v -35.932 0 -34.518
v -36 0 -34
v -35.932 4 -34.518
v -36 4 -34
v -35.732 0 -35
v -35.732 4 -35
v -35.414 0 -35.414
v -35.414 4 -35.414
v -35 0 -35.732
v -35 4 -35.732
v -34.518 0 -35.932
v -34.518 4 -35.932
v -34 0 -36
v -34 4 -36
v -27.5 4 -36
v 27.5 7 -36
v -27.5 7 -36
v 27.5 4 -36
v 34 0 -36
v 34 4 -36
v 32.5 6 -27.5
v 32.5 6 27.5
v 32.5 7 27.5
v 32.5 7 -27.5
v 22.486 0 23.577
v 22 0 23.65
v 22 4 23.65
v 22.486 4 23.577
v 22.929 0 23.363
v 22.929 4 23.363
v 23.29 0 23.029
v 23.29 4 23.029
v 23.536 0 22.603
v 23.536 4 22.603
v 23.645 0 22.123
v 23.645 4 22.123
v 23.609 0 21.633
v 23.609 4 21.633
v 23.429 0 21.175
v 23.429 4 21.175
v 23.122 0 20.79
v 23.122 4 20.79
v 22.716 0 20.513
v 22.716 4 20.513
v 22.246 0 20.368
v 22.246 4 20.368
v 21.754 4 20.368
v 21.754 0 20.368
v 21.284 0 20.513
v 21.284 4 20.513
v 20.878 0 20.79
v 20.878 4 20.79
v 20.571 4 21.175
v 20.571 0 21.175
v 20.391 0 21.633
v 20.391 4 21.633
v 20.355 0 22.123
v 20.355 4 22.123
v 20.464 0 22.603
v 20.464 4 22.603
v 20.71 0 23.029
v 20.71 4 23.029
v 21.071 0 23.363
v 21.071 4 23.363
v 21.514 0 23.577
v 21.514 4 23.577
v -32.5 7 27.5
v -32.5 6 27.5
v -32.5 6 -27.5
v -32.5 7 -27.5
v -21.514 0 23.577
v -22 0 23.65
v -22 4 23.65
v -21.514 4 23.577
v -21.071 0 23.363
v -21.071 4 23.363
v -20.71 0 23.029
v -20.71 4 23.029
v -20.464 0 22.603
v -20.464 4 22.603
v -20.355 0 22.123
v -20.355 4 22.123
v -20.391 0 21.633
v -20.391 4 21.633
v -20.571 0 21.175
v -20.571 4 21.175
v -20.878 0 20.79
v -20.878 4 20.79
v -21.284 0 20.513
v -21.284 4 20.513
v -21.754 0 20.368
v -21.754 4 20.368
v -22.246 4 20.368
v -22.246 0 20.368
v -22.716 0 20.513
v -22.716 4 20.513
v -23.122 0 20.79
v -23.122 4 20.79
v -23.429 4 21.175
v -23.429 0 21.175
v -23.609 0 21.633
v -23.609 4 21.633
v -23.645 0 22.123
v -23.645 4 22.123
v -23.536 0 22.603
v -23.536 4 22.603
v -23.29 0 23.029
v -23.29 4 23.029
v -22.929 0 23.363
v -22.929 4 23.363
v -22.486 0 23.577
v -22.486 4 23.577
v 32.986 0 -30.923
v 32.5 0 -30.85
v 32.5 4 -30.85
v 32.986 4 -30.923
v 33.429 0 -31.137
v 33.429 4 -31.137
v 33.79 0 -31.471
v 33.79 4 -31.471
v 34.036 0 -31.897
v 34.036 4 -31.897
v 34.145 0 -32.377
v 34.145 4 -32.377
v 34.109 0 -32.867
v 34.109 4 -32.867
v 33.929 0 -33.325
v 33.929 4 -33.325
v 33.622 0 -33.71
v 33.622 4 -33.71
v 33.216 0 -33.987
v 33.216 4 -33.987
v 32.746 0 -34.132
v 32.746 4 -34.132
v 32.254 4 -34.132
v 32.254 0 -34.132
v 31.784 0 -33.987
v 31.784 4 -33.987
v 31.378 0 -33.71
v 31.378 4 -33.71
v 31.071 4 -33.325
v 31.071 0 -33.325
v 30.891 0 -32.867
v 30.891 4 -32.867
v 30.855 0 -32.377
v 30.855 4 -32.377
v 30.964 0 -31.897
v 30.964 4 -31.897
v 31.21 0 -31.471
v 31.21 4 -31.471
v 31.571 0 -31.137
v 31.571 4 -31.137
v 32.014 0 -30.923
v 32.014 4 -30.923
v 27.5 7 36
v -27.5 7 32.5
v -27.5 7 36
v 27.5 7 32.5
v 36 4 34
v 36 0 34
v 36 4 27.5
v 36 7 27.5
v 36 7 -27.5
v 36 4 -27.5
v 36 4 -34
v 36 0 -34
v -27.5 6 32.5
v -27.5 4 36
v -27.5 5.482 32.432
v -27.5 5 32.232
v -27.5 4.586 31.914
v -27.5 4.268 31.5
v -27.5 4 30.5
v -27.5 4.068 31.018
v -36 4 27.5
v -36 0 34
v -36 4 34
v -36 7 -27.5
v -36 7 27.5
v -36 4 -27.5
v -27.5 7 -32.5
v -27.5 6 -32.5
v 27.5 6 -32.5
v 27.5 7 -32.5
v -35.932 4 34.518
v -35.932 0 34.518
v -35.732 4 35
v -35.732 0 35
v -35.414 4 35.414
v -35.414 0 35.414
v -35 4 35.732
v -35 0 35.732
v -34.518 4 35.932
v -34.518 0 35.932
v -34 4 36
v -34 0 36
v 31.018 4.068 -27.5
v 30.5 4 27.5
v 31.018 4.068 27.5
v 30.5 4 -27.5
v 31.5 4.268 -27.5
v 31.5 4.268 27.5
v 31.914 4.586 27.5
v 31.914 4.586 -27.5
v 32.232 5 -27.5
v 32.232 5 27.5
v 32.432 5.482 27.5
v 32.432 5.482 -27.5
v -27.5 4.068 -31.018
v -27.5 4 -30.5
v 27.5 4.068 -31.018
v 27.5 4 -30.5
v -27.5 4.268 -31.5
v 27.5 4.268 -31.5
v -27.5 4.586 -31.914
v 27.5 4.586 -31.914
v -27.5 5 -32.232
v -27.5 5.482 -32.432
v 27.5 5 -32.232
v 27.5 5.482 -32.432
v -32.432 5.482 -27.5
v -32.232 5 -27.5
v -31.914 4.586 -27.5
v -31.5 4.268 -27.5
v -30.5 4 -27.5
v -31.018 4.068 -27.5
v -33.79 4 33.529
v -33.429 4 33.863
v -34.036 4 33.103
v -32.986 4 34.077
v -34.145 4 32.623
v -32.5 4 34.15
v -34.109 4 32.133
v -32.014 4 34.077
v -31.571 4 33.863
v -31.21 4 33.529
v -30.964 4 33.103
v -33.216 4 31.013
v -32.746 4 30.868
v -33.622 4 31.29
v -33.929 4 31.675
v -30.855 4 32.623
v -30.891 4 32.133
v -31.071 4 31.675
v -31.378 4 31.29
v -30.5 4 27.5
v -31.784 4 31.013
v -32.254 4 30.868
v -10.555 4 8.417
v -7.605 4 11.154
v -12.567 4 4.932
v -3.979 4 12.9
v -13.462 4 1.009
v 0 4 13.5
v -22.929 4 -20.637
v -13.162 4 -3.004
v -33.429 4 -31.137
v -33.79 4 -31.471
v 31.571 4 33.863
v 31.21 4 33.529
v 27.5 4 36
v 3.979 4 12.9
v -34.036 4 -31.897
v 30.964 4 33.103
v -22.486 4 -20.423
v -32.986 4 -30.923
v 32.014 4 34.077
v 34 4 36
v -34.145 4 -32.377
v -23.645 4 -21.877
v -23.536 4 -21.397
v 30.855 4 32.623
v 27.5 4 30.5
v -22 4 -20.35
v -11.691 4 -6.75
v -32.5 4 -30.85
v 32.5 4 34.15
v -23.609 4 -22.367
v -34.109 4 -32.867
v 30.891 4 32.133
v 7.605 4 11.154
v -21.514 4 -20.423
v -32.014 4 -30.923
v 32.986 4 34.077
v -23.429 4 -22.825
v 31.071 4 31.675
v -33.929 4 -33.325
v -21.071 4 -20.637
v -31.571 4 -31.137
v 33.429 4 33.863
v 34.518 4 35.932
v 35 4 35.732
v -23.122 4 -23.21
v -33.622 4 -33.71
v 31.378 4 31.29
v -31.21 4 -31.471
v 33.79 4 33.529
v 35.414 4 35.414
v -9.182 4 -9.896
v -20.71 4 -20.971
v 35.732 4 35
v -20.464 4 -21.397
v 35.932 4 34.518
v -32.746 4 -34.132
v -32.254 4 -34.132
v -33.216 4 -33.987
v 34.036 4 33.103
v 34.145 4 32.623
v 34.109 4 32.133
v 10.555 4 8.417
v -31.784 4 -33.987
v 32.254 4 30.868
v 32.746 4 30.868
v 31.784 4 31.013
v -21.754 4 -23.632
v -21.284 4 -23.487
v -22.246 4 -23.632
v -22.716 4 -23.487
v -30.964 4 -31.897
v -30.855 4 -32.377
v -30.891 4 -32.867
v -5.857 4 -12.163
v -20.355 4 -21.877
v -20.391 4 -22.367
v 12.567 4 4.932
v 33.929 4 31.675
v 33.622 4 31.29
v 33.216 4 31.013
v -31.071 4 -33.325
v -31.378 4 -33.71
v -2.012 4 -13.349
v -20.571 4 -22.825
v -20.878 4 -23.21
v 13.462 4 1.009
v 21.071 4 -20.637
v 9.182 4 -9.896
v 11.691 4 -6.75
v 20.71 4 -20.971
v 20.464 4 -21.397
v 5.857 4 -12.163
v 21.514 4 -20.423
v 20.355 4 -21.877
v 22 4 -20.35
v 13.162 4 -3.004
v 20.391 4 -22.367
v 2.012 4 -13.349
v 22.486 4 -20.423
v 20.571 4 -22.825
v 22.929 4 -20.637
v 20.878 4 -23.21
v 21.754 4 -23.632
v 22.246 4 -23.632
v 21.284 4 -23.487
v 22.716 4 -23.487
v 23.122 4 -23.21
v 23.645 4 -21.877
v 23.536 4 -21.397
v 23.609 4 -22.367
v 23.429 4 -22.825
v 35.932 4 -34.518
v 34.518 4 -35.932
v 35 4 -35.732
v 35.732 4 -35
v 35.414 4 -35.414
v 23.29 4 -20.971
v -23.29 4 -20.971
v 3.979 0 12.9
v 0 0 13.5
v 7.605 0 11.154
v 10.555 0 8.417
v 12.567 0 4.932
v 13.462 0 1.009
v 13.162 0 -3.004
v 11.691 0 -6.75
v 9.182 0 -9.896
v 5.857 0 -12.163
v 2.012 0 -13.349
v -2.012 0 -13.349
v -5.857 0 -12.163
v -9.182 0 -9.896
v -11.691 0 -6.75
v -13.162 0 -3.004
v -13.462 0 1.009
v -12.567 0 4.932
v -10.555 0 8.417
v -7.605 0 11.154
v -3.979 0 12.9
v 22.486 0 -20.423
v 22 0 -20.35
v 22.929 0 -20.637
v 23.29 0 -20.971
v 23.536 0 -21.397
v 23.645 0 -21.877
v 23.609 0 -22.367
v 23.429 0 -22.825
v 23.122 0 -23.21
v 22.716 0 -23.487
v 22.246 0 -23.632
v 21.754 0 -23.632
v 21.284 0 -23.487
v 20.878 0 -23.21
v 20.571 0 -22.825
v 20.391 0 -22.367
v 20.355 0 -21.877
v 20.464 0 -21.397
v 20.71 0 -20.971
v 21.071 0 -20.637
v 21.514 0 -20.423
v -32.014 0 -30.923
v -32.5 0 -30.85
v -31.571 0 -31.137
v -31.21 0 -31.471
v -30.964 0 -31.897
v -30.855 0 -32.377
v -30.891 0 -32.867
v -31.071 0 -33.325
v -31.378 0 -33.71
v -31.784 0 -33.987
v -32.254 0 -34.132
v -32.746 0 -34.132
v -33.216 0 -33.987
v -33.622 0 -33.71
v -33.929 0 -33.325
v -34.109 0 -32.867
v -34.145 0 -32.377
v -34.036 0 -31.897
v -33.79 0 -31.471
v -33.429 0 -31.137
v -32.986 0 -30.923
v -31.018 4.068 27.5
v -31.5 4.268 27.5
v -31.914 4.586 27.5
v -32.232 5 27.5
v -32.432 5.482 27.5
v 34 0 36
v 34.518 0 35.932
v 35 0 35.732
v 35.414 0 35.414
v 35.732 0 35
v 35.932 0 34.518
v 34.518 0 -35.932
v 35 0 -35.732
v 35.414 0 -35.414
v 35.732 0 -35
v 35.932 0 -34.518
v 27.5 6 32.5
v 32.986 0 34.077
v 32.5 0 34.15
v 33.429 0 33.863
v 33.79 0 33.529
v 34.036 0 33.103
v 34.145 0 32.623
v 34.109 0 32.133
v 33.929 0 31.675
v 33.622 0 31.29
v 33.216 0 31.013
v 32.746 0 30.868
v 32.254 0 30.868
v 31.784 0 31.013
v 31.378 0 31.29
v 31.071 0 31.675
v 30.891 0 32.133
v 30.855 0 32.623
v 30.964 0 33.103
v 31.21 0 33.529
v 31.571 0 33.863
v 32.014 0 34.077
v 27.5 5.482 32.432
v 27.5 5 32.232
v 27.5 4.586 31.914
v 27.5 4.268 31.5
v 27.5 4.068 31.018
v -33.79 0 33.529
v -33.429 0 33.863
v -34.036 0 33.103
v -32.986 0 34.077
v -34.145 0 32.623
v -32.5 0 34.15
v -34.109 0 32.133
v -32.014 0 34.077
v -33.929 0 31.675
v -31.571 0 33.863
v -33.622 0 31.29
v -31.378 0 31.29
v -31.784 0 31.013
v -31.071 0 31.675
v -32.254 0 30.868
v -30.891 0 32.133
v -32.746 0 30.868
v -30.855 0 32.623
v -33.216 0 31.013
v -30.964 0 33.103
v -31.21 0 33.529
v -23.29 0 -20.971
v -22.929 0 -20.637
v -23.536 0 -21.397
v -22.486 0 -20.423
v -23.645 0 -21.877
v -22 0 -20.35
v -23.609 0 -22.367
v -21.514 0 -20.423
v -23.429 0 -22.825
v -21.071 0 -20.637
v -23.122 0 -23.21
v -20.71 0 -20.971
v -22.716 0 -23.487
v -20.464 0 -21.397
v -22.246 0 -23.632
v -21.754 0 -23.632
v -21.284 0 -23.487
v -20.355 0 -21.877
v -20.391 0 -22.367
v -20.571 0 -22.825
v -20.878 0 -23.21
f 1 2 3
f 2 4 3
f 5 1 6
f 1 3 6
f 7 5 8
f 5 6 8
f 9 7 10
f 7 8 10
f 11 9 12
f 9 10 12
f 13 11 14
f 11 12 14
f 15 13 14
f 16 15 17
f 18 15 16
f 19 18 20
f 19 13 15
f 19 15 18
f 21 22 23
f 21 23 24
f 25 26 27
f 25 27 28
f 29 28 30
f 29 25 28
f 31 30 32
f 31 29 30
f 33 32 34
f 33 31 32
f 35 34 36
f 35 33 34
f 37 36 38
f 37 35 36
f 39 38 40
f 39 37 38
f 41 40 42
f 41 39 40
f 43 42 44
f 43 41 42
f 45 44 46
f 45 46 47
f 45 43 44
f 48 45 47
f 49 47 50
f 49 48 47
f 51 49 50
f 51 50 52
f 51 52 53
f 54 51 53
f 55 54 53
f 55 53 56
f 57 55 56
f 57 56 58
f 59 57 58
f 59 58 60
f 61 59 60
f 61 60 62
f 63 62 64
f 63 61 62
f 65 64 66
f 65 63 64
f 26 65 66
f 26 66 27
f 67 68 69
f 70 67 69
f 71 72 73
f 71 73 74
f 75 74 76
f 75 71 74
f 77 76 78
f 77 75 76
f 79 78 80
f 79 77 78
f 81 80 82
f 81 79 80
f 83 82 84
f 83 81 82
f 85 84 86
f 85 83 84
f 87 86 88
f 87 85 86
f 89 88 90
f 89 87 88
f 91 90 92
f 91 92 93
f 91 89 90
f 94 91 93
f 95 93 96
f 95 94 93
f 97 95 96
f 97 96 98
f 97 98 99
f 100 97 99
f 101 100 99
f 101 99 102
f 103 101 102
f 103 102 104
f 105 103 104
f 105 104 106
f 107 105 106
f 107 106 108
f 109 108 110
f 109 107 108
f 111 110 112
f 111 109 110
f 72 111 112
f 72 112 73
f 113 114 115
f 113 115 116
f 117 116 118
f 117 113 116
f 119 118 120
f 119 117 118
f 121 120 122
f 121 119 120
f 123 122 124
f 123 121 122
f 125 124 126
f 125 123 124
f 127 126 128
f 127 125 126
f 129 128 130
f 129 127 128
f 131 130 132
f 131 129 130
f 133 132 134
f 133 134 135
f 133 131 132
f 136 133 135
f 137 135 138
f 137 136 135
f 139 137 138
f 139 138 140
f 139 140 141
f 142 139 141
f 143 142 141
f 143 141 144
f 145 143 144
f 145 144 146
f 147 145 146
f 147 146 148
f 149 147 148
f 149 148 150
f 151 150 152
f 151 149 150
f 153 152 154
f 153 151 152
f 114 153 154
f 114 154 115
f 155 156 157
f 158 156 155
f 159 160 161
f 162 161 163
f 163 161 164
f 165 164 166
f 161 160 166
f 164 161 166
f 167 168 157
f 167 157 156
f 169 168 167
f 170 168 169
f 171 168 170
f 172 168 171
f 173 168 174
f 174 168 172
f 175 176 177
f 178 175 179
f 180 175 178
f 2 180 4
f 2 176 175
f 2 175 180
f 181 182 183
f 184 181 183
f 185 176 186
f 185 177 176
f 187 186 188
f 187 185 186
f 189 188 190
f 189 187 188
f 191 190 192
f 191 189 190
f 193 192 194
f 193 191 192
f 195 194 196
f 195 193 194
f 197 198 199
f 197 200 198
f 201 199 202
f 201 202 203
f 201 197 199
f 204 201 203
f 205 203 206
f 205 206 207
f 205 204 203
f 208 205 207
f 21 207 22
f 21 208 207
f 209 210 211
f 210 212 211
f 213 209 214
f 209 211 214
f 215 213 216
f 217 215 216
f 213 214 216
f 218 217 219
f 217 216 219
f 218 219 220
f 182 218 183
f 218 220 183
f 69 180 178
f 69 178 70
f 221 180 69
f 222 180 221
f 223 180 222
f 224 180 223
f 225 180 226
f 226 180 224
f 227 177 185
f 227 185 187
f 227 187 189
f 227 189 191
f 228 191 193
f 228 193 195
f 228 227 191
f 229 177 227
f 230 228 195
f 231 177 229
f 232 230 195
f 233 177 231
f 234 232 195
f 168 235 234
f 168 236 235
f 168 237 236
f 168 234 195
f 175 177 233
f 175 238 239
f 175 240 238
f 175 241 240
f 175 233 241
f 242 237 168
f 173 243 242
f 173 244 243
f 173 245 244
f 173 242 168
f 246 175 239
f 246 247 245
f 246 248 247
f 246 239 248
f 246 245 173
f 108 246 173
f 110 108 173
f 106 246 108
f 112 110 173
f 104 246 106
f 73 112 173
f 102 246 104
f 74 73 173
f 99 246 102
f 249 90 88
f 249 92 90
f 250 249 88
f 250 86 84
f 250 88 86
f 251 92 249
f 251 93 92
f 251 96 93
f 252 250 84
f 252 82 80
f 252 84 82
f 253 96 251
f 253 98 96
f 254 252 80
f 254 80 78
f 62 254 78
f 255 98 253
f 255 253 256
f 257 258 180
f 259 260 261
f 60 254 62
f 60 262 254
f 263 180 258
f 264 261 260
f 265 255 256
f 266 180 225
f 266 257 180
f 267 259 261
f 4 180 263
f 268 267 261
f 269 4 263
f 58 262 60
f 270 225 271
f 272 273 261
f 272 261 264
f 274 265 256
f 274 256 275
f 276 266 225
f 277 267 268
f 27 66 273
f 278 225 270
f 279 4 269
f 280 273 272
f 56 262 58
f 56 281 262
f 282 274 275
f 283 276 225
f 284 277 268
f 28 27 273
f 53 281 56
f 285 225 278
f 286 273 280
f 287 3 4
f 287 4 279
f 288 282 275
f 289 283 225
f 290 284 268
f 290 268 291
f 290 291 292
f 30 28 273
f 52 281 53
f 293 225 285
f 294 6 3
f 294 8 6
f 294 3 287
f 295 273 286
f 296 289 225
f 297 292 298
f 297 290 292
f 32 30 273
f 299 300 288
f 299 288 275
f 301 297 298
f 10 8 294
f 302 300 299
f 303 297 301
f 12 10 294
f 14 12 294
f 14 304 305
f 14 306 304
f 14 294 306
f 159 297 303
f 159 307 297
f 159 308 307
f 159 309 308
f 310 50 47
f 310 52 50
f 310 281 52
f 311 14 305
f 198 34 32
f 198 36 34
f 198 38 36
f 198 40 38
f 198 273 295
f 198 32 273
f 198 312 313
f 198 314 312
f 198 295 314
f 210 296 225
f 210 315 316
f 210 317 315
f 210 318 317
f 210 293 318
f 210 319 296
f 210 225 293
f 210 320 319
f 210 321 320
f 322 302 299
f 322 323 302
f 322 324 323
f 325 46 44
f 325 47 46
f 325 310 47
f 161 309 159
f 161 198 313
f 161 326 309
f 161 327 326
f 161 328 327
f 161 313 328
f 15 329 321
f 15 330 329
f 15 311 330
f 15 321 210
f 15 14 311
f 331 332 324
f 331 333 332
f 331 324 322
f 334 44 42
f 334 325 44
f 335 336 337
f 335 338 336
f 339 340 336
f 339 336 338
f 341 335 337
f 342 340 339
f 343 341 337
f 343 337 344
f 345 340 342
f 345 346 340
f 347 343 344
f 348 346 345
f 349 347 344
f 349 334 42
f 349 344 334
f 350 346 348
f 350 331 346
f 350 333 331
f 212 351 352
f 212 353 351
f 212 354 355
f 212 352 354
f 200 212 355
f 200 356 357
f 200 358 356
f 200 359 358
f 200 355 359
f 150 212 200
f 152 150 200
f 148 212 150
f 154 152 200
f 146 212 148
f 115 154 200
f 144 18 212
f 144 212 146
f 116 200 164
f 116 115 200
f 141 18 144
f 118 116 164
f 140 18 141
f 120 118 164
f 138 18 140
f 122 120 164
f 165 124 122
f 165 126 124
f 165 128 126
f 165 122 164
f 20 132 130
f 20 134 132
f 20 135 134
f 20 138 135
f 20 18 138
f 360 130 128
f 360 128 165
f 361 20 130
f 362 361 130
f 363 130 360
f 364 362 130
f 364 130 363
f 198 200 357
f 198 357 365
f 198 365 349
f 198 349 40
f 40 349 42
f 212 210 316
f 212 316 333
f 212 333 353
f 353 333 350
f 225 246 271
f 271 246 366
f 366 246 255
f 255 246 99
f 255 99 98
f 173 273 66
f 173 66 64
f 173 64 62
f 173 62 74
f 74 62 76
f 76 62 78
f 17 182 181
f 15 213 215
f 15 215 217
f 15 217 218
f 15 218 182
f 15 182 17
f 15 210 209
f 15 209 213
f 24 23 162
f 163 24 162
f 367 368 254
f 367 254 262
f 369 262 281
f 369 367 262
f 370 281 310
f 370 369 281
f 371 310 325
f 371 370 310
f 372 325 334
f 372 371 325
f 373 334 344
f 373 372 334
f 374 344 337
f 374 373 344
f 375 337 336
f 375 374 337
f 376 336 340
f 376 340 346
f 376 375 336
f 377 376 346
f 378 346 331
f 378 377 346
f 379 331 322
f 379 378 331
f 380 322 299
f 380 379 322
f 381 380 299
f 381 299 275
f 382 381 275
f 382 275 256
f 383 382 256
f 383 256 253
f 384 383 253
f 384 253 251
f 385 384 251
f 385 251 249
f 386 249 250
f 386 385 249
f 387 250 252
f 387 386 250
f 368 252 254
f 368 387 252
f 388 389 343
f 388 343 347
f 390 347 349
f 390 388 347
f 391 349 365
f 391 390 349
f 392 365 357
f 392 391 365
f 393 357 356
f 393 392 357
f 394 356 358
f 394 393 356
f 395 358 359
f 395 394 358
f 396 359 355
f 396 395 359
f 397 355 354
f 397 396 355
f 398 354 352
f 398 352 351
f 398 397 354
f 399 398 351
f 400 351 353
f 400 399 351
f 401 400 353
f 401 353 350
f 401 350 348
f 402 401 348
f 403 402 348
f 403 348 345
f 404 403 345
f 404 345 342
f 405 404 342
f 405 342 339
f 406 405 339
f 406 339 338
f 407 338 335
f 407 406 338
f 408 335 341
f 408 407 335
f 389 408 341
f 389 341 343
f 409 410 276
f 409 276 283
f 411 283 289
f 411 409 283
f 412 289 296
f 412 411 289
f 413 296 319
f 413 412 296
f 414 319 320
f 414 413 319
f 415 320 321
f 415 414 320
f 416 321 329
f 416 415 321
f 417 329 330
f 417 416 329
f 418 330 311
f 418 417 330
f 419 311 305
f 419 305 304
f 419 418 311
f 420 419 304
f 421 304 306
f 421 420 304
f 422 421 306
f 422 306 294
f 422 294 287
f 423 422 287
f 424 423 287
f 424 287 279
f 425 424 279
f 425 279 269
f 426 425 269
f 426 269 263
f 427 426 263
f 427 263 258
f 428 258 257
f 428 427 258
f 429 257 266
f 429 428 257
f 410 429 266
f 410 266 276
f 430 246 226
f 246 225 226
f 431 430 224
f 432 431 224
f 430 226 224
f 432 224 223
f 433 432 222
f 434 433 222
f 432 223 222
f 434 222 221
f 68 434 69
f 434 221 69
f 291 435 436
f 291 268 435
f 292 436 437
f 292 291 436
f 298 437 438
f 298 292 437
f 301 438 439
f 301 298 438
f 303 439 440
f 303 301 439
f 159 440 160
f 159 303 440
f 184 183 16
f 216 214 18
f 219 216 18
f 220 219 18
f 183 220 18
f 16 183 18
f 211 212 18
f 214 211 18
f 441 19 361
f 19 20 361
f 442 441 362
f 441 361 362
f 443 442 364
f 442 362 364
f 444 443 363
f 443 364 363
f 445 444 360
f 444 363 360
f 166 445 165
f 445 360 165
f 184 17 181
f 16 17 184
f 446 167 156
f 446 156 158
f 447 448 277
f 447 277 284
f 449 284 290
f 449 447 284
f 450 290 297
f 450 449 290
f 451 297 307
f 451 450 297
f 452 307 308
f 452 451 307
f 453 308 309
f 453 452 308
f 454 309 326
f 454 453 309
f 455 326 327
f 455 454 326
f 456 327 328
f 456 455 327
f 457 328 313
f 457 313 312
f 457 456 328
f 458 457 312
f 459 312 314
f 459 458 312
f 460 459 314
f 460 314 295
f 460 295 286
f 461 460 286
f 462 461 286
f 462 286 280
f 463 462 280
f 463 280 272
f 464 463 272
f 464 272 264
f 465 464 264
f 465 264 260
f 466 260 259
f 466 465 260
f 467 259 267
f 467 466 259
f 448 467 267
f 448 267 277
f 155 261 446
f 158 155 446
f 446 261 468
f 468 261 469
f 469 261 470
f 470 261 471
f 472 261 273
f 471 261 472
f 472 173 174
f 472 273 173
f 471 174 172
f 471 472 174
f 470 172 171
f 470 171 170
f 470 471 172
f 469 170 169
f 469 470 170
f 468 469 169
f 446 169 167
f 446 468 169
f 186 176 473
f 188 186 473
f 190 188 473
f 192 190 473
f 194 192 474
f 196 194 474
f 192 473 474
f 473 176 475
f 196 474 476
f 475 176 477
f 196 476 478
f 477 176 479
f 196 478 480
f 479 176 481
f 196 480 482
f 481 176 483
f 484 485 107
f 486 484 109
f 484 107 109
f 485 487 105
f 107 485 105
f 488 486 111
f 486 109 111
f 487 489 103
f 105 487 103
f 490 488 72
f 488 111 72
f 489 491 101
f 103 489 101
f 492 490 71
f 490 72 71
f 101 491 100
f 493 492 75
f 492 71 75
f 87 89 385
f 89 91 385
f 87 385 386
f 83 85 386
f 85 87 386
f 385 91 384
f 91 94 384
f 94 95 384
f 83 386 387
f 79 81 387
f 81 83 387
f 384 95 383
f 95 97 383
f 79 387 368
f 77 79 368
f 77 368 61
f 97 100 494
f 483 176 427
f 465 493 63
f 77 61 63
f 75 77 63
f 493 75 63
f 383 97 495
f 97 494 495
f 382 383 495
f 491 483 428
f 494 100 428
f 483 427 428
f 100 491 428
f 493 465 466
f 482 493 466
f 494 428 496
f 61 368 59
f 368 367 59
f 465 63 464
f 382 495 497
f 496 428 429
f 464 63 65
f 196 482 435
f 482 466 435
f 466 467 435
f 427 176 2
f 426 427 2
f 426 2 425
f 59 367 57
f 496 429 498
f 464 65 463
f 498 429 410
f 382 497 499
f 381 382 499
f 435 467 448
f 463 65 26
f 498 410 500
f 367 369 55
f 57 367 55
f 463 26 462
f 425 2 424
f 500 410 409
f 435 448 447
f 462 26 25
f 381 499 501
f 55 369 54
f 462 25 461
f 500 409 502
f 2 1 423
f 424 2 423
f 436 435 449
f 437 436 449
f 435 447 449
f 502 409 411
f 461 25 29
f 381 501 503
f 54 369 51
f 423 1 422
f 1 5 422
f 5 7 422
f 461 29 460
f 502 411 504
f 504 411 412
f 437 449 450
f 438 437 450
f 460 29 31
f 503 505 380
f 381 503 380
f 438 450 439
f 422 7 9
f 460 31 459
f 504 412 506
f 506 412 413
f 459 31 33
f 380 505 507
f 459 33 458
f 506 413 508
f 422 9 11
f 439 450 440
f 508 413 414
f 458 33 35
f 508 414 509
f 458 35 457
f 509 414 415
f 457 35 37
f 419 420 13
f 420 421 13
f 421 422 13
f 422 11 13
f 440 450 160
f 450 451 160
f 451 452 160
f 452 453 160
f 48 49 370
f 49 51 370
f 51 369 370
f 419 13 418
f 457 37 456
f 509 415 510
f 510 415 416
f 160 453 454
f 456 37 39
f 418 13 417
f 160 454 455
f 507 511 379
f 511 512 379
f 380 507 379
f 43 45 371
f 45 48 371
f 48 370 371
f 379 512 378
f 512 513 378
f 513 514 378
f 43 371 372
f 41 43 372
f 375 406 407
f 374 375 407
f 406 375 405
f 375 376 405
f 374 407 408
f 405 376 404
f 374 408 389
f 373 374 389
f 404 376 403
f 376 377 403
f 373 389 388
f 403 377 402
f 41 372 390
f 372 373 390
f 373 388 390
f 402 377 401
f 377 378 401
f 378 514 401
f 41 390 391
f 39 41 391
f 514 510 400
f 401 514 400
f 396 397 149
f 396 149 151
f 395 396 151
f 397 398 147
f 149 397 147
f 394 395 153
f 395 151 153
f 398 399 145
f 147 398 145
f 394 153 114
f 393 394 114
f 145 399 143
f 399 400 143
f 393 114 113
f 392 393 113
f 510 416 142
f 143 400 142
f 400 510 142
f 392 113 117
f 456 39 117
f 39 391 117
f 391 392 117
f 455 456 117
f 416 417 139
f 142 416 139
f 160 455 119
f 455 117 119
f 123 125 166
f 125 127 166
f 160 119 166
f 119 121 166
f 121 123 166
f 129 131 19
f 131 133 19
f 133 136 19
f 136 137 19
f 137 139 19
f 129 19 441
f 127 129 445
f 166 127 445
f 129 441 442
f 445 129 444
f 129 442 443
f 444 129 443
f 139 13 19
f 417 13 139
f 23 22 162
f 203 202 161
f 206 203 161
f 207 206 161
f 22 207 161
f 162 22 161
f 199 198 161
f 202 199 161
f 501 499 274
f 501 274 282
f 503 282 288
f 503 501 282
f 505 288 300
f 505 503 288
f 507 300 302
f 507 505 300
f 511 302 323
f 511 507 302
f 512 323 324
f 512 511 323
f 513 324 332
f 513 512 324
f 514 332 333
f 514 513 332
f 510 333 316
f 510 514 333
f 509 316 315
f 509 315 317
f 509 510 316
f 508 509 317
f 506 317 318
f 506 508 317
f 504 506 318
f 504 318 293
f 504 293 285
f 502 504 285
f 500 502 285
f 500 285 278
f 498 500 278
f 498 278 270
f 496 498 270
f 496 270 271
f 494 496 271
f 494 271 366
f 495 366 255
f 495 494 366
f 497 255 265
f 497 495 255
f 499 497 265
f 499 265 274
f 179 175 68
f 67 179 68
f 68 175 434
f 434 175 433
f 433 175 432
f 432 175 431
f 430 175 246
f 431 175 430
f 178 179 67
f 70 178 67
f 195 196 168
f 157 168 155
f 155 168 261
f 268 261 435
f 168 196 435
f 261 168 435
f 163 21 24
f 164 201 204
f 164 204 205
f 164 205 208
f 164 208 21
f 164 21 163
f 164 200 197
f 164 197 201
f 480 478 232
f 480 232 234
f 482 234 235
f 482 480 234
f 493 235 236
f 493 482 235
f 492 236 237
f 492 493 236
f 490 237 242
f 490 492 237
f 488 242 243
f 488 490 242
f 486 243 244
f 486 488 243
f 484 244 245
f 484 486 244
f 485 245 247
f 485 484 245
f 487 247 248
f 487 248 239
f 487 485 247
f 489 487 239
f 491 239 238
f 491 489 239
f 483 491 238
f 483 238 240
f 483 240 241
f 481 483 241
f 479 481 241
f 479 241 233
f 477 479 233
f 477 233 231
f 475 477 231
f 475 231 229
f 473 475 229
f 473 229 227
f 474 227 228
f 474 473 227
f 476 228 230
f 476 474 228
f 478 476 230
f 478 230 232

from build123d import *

# Parameters (mm, degrees)
SKETCH_1_W          = 72
SKETCH_1_H          = 72
SKETCH_1_R          = 13.5
EXTRUDE_1_DEPTH     = 4
SKETCH_2_R          = 1.65
CUT_EXTRUDE_5_DEPTH = 4
FILLET_1_R          = 2
SKETCH_3_W          = 3.5
SKETCH_3_H          = 55
SKETCH_3_W_2        = 55
SKETCH_3_H_2        = 3.5
EXTRUDE_2_DEPTH     = 3
FILLET_2_R          = 2


with BuildPart() as part:
    # 草图1 → 凸台-拉伸1 (new body)
    with BuildSketch(Plane(origin=(0, 0, 0), x_dir=(1, 0, 0), z_dir=(0, 1, 0))):
        Rectangle(SKETCH_1_W, SKETCH_1_H)
        with Locations(Location((0, 0, 0), (0, 0, 270))):
            Circle(SKETCH_1_R, mode=Mode.SUBTRACT)
    extrude(amount=EXTRUDE_1_DEPTH)

    # 草图2 → 切除-拉伸5 (cut)
    with BuildSketch(Plane(origin=(0, 0, 0), x_dir=(1, 0, 0), z_dir=(0, 1, 0))):
        with Locations(Location((-22, 22, 0), (0, 0, 270))):
            Circle(SKETCH_2_R)
        with Locations(Location((22, 22, 0), (0, 0, 270))):
            Circle(SKETCH_2_R)
        with Locations(Location((22, -22, 0), (0, 0, 270))):
            Circle(SKETCH_2_R)
        with Locations(Location((-22, -22, 0), (0, 0, 270))):
            Circle(SKETCH_2_R)
        with Locations(Location((-32.5, 32.5, 0), (0, 0, 270))):
            Circle(SKETCH_2_R)
        with Locations(Location((32.5, 32.5, 0), (0, 0, 270))):
            Circle(SKETCH_2_R)
        with Locations(Location((32.5, -32.5, 0), (0, 0, 270))):
            Circle(SKETCH_2_R)
        with Locations(Location((-32.5, -32.5, 0), (0, 0, 270))):
            Circle(SKETCH_2_R)
    extrude(amount=CUT_EXTRUDE_5_DEPTH, mode=Mode.SUBTRACT)

    # 圆角1
    fillet_1_edges = [part.edges().sort_by_distance(p)[0] for p in [
        (36, 2, 36),
        (-36, 2, 36),
        (-36, 2, -36),
        (36, 2, -36),
    ]]
    fillet(fillet_1_edges, radius=FILLET_1_R)

    # 草图3 → 凸台-拉伸2 (add)
    with BuildSketch(Plane(origin=(0, 4, 0), x_dir=(1, 0, 0), z_dir=(0, 1, 0))):
        with Locations((-34.25, 0)):
            Rectangle(SKETCH_3_W, SKETCH_3_H)
        with Locations((0, 34.25)):
            Rectangle(SKETCH_3_W_2, SKETCH_3_H_2)
        with Locations((34.25, 0)):
            Rectangle(SKETCH_3_W, SKETCH_3_H)
        with Locations((0, -34.25)):
            Rectangle(SKETCH_3_W_2, SKETCH_3_H_2)
    extrude(amount=EXTRUDE_2_DEPTH)

    # 圆角2
    fillet_2_edges = [part.edges().sort_by_distance(p)[0] for p in [
        (32.5, 4, 0),
        (0, 4, 32.5),
        (-32.5, 4, 0),
        (0, 4, -32.5),
    ]]
    fillet(fillet_2_edges, radius=FILLET_2_R)


solid = part.part
